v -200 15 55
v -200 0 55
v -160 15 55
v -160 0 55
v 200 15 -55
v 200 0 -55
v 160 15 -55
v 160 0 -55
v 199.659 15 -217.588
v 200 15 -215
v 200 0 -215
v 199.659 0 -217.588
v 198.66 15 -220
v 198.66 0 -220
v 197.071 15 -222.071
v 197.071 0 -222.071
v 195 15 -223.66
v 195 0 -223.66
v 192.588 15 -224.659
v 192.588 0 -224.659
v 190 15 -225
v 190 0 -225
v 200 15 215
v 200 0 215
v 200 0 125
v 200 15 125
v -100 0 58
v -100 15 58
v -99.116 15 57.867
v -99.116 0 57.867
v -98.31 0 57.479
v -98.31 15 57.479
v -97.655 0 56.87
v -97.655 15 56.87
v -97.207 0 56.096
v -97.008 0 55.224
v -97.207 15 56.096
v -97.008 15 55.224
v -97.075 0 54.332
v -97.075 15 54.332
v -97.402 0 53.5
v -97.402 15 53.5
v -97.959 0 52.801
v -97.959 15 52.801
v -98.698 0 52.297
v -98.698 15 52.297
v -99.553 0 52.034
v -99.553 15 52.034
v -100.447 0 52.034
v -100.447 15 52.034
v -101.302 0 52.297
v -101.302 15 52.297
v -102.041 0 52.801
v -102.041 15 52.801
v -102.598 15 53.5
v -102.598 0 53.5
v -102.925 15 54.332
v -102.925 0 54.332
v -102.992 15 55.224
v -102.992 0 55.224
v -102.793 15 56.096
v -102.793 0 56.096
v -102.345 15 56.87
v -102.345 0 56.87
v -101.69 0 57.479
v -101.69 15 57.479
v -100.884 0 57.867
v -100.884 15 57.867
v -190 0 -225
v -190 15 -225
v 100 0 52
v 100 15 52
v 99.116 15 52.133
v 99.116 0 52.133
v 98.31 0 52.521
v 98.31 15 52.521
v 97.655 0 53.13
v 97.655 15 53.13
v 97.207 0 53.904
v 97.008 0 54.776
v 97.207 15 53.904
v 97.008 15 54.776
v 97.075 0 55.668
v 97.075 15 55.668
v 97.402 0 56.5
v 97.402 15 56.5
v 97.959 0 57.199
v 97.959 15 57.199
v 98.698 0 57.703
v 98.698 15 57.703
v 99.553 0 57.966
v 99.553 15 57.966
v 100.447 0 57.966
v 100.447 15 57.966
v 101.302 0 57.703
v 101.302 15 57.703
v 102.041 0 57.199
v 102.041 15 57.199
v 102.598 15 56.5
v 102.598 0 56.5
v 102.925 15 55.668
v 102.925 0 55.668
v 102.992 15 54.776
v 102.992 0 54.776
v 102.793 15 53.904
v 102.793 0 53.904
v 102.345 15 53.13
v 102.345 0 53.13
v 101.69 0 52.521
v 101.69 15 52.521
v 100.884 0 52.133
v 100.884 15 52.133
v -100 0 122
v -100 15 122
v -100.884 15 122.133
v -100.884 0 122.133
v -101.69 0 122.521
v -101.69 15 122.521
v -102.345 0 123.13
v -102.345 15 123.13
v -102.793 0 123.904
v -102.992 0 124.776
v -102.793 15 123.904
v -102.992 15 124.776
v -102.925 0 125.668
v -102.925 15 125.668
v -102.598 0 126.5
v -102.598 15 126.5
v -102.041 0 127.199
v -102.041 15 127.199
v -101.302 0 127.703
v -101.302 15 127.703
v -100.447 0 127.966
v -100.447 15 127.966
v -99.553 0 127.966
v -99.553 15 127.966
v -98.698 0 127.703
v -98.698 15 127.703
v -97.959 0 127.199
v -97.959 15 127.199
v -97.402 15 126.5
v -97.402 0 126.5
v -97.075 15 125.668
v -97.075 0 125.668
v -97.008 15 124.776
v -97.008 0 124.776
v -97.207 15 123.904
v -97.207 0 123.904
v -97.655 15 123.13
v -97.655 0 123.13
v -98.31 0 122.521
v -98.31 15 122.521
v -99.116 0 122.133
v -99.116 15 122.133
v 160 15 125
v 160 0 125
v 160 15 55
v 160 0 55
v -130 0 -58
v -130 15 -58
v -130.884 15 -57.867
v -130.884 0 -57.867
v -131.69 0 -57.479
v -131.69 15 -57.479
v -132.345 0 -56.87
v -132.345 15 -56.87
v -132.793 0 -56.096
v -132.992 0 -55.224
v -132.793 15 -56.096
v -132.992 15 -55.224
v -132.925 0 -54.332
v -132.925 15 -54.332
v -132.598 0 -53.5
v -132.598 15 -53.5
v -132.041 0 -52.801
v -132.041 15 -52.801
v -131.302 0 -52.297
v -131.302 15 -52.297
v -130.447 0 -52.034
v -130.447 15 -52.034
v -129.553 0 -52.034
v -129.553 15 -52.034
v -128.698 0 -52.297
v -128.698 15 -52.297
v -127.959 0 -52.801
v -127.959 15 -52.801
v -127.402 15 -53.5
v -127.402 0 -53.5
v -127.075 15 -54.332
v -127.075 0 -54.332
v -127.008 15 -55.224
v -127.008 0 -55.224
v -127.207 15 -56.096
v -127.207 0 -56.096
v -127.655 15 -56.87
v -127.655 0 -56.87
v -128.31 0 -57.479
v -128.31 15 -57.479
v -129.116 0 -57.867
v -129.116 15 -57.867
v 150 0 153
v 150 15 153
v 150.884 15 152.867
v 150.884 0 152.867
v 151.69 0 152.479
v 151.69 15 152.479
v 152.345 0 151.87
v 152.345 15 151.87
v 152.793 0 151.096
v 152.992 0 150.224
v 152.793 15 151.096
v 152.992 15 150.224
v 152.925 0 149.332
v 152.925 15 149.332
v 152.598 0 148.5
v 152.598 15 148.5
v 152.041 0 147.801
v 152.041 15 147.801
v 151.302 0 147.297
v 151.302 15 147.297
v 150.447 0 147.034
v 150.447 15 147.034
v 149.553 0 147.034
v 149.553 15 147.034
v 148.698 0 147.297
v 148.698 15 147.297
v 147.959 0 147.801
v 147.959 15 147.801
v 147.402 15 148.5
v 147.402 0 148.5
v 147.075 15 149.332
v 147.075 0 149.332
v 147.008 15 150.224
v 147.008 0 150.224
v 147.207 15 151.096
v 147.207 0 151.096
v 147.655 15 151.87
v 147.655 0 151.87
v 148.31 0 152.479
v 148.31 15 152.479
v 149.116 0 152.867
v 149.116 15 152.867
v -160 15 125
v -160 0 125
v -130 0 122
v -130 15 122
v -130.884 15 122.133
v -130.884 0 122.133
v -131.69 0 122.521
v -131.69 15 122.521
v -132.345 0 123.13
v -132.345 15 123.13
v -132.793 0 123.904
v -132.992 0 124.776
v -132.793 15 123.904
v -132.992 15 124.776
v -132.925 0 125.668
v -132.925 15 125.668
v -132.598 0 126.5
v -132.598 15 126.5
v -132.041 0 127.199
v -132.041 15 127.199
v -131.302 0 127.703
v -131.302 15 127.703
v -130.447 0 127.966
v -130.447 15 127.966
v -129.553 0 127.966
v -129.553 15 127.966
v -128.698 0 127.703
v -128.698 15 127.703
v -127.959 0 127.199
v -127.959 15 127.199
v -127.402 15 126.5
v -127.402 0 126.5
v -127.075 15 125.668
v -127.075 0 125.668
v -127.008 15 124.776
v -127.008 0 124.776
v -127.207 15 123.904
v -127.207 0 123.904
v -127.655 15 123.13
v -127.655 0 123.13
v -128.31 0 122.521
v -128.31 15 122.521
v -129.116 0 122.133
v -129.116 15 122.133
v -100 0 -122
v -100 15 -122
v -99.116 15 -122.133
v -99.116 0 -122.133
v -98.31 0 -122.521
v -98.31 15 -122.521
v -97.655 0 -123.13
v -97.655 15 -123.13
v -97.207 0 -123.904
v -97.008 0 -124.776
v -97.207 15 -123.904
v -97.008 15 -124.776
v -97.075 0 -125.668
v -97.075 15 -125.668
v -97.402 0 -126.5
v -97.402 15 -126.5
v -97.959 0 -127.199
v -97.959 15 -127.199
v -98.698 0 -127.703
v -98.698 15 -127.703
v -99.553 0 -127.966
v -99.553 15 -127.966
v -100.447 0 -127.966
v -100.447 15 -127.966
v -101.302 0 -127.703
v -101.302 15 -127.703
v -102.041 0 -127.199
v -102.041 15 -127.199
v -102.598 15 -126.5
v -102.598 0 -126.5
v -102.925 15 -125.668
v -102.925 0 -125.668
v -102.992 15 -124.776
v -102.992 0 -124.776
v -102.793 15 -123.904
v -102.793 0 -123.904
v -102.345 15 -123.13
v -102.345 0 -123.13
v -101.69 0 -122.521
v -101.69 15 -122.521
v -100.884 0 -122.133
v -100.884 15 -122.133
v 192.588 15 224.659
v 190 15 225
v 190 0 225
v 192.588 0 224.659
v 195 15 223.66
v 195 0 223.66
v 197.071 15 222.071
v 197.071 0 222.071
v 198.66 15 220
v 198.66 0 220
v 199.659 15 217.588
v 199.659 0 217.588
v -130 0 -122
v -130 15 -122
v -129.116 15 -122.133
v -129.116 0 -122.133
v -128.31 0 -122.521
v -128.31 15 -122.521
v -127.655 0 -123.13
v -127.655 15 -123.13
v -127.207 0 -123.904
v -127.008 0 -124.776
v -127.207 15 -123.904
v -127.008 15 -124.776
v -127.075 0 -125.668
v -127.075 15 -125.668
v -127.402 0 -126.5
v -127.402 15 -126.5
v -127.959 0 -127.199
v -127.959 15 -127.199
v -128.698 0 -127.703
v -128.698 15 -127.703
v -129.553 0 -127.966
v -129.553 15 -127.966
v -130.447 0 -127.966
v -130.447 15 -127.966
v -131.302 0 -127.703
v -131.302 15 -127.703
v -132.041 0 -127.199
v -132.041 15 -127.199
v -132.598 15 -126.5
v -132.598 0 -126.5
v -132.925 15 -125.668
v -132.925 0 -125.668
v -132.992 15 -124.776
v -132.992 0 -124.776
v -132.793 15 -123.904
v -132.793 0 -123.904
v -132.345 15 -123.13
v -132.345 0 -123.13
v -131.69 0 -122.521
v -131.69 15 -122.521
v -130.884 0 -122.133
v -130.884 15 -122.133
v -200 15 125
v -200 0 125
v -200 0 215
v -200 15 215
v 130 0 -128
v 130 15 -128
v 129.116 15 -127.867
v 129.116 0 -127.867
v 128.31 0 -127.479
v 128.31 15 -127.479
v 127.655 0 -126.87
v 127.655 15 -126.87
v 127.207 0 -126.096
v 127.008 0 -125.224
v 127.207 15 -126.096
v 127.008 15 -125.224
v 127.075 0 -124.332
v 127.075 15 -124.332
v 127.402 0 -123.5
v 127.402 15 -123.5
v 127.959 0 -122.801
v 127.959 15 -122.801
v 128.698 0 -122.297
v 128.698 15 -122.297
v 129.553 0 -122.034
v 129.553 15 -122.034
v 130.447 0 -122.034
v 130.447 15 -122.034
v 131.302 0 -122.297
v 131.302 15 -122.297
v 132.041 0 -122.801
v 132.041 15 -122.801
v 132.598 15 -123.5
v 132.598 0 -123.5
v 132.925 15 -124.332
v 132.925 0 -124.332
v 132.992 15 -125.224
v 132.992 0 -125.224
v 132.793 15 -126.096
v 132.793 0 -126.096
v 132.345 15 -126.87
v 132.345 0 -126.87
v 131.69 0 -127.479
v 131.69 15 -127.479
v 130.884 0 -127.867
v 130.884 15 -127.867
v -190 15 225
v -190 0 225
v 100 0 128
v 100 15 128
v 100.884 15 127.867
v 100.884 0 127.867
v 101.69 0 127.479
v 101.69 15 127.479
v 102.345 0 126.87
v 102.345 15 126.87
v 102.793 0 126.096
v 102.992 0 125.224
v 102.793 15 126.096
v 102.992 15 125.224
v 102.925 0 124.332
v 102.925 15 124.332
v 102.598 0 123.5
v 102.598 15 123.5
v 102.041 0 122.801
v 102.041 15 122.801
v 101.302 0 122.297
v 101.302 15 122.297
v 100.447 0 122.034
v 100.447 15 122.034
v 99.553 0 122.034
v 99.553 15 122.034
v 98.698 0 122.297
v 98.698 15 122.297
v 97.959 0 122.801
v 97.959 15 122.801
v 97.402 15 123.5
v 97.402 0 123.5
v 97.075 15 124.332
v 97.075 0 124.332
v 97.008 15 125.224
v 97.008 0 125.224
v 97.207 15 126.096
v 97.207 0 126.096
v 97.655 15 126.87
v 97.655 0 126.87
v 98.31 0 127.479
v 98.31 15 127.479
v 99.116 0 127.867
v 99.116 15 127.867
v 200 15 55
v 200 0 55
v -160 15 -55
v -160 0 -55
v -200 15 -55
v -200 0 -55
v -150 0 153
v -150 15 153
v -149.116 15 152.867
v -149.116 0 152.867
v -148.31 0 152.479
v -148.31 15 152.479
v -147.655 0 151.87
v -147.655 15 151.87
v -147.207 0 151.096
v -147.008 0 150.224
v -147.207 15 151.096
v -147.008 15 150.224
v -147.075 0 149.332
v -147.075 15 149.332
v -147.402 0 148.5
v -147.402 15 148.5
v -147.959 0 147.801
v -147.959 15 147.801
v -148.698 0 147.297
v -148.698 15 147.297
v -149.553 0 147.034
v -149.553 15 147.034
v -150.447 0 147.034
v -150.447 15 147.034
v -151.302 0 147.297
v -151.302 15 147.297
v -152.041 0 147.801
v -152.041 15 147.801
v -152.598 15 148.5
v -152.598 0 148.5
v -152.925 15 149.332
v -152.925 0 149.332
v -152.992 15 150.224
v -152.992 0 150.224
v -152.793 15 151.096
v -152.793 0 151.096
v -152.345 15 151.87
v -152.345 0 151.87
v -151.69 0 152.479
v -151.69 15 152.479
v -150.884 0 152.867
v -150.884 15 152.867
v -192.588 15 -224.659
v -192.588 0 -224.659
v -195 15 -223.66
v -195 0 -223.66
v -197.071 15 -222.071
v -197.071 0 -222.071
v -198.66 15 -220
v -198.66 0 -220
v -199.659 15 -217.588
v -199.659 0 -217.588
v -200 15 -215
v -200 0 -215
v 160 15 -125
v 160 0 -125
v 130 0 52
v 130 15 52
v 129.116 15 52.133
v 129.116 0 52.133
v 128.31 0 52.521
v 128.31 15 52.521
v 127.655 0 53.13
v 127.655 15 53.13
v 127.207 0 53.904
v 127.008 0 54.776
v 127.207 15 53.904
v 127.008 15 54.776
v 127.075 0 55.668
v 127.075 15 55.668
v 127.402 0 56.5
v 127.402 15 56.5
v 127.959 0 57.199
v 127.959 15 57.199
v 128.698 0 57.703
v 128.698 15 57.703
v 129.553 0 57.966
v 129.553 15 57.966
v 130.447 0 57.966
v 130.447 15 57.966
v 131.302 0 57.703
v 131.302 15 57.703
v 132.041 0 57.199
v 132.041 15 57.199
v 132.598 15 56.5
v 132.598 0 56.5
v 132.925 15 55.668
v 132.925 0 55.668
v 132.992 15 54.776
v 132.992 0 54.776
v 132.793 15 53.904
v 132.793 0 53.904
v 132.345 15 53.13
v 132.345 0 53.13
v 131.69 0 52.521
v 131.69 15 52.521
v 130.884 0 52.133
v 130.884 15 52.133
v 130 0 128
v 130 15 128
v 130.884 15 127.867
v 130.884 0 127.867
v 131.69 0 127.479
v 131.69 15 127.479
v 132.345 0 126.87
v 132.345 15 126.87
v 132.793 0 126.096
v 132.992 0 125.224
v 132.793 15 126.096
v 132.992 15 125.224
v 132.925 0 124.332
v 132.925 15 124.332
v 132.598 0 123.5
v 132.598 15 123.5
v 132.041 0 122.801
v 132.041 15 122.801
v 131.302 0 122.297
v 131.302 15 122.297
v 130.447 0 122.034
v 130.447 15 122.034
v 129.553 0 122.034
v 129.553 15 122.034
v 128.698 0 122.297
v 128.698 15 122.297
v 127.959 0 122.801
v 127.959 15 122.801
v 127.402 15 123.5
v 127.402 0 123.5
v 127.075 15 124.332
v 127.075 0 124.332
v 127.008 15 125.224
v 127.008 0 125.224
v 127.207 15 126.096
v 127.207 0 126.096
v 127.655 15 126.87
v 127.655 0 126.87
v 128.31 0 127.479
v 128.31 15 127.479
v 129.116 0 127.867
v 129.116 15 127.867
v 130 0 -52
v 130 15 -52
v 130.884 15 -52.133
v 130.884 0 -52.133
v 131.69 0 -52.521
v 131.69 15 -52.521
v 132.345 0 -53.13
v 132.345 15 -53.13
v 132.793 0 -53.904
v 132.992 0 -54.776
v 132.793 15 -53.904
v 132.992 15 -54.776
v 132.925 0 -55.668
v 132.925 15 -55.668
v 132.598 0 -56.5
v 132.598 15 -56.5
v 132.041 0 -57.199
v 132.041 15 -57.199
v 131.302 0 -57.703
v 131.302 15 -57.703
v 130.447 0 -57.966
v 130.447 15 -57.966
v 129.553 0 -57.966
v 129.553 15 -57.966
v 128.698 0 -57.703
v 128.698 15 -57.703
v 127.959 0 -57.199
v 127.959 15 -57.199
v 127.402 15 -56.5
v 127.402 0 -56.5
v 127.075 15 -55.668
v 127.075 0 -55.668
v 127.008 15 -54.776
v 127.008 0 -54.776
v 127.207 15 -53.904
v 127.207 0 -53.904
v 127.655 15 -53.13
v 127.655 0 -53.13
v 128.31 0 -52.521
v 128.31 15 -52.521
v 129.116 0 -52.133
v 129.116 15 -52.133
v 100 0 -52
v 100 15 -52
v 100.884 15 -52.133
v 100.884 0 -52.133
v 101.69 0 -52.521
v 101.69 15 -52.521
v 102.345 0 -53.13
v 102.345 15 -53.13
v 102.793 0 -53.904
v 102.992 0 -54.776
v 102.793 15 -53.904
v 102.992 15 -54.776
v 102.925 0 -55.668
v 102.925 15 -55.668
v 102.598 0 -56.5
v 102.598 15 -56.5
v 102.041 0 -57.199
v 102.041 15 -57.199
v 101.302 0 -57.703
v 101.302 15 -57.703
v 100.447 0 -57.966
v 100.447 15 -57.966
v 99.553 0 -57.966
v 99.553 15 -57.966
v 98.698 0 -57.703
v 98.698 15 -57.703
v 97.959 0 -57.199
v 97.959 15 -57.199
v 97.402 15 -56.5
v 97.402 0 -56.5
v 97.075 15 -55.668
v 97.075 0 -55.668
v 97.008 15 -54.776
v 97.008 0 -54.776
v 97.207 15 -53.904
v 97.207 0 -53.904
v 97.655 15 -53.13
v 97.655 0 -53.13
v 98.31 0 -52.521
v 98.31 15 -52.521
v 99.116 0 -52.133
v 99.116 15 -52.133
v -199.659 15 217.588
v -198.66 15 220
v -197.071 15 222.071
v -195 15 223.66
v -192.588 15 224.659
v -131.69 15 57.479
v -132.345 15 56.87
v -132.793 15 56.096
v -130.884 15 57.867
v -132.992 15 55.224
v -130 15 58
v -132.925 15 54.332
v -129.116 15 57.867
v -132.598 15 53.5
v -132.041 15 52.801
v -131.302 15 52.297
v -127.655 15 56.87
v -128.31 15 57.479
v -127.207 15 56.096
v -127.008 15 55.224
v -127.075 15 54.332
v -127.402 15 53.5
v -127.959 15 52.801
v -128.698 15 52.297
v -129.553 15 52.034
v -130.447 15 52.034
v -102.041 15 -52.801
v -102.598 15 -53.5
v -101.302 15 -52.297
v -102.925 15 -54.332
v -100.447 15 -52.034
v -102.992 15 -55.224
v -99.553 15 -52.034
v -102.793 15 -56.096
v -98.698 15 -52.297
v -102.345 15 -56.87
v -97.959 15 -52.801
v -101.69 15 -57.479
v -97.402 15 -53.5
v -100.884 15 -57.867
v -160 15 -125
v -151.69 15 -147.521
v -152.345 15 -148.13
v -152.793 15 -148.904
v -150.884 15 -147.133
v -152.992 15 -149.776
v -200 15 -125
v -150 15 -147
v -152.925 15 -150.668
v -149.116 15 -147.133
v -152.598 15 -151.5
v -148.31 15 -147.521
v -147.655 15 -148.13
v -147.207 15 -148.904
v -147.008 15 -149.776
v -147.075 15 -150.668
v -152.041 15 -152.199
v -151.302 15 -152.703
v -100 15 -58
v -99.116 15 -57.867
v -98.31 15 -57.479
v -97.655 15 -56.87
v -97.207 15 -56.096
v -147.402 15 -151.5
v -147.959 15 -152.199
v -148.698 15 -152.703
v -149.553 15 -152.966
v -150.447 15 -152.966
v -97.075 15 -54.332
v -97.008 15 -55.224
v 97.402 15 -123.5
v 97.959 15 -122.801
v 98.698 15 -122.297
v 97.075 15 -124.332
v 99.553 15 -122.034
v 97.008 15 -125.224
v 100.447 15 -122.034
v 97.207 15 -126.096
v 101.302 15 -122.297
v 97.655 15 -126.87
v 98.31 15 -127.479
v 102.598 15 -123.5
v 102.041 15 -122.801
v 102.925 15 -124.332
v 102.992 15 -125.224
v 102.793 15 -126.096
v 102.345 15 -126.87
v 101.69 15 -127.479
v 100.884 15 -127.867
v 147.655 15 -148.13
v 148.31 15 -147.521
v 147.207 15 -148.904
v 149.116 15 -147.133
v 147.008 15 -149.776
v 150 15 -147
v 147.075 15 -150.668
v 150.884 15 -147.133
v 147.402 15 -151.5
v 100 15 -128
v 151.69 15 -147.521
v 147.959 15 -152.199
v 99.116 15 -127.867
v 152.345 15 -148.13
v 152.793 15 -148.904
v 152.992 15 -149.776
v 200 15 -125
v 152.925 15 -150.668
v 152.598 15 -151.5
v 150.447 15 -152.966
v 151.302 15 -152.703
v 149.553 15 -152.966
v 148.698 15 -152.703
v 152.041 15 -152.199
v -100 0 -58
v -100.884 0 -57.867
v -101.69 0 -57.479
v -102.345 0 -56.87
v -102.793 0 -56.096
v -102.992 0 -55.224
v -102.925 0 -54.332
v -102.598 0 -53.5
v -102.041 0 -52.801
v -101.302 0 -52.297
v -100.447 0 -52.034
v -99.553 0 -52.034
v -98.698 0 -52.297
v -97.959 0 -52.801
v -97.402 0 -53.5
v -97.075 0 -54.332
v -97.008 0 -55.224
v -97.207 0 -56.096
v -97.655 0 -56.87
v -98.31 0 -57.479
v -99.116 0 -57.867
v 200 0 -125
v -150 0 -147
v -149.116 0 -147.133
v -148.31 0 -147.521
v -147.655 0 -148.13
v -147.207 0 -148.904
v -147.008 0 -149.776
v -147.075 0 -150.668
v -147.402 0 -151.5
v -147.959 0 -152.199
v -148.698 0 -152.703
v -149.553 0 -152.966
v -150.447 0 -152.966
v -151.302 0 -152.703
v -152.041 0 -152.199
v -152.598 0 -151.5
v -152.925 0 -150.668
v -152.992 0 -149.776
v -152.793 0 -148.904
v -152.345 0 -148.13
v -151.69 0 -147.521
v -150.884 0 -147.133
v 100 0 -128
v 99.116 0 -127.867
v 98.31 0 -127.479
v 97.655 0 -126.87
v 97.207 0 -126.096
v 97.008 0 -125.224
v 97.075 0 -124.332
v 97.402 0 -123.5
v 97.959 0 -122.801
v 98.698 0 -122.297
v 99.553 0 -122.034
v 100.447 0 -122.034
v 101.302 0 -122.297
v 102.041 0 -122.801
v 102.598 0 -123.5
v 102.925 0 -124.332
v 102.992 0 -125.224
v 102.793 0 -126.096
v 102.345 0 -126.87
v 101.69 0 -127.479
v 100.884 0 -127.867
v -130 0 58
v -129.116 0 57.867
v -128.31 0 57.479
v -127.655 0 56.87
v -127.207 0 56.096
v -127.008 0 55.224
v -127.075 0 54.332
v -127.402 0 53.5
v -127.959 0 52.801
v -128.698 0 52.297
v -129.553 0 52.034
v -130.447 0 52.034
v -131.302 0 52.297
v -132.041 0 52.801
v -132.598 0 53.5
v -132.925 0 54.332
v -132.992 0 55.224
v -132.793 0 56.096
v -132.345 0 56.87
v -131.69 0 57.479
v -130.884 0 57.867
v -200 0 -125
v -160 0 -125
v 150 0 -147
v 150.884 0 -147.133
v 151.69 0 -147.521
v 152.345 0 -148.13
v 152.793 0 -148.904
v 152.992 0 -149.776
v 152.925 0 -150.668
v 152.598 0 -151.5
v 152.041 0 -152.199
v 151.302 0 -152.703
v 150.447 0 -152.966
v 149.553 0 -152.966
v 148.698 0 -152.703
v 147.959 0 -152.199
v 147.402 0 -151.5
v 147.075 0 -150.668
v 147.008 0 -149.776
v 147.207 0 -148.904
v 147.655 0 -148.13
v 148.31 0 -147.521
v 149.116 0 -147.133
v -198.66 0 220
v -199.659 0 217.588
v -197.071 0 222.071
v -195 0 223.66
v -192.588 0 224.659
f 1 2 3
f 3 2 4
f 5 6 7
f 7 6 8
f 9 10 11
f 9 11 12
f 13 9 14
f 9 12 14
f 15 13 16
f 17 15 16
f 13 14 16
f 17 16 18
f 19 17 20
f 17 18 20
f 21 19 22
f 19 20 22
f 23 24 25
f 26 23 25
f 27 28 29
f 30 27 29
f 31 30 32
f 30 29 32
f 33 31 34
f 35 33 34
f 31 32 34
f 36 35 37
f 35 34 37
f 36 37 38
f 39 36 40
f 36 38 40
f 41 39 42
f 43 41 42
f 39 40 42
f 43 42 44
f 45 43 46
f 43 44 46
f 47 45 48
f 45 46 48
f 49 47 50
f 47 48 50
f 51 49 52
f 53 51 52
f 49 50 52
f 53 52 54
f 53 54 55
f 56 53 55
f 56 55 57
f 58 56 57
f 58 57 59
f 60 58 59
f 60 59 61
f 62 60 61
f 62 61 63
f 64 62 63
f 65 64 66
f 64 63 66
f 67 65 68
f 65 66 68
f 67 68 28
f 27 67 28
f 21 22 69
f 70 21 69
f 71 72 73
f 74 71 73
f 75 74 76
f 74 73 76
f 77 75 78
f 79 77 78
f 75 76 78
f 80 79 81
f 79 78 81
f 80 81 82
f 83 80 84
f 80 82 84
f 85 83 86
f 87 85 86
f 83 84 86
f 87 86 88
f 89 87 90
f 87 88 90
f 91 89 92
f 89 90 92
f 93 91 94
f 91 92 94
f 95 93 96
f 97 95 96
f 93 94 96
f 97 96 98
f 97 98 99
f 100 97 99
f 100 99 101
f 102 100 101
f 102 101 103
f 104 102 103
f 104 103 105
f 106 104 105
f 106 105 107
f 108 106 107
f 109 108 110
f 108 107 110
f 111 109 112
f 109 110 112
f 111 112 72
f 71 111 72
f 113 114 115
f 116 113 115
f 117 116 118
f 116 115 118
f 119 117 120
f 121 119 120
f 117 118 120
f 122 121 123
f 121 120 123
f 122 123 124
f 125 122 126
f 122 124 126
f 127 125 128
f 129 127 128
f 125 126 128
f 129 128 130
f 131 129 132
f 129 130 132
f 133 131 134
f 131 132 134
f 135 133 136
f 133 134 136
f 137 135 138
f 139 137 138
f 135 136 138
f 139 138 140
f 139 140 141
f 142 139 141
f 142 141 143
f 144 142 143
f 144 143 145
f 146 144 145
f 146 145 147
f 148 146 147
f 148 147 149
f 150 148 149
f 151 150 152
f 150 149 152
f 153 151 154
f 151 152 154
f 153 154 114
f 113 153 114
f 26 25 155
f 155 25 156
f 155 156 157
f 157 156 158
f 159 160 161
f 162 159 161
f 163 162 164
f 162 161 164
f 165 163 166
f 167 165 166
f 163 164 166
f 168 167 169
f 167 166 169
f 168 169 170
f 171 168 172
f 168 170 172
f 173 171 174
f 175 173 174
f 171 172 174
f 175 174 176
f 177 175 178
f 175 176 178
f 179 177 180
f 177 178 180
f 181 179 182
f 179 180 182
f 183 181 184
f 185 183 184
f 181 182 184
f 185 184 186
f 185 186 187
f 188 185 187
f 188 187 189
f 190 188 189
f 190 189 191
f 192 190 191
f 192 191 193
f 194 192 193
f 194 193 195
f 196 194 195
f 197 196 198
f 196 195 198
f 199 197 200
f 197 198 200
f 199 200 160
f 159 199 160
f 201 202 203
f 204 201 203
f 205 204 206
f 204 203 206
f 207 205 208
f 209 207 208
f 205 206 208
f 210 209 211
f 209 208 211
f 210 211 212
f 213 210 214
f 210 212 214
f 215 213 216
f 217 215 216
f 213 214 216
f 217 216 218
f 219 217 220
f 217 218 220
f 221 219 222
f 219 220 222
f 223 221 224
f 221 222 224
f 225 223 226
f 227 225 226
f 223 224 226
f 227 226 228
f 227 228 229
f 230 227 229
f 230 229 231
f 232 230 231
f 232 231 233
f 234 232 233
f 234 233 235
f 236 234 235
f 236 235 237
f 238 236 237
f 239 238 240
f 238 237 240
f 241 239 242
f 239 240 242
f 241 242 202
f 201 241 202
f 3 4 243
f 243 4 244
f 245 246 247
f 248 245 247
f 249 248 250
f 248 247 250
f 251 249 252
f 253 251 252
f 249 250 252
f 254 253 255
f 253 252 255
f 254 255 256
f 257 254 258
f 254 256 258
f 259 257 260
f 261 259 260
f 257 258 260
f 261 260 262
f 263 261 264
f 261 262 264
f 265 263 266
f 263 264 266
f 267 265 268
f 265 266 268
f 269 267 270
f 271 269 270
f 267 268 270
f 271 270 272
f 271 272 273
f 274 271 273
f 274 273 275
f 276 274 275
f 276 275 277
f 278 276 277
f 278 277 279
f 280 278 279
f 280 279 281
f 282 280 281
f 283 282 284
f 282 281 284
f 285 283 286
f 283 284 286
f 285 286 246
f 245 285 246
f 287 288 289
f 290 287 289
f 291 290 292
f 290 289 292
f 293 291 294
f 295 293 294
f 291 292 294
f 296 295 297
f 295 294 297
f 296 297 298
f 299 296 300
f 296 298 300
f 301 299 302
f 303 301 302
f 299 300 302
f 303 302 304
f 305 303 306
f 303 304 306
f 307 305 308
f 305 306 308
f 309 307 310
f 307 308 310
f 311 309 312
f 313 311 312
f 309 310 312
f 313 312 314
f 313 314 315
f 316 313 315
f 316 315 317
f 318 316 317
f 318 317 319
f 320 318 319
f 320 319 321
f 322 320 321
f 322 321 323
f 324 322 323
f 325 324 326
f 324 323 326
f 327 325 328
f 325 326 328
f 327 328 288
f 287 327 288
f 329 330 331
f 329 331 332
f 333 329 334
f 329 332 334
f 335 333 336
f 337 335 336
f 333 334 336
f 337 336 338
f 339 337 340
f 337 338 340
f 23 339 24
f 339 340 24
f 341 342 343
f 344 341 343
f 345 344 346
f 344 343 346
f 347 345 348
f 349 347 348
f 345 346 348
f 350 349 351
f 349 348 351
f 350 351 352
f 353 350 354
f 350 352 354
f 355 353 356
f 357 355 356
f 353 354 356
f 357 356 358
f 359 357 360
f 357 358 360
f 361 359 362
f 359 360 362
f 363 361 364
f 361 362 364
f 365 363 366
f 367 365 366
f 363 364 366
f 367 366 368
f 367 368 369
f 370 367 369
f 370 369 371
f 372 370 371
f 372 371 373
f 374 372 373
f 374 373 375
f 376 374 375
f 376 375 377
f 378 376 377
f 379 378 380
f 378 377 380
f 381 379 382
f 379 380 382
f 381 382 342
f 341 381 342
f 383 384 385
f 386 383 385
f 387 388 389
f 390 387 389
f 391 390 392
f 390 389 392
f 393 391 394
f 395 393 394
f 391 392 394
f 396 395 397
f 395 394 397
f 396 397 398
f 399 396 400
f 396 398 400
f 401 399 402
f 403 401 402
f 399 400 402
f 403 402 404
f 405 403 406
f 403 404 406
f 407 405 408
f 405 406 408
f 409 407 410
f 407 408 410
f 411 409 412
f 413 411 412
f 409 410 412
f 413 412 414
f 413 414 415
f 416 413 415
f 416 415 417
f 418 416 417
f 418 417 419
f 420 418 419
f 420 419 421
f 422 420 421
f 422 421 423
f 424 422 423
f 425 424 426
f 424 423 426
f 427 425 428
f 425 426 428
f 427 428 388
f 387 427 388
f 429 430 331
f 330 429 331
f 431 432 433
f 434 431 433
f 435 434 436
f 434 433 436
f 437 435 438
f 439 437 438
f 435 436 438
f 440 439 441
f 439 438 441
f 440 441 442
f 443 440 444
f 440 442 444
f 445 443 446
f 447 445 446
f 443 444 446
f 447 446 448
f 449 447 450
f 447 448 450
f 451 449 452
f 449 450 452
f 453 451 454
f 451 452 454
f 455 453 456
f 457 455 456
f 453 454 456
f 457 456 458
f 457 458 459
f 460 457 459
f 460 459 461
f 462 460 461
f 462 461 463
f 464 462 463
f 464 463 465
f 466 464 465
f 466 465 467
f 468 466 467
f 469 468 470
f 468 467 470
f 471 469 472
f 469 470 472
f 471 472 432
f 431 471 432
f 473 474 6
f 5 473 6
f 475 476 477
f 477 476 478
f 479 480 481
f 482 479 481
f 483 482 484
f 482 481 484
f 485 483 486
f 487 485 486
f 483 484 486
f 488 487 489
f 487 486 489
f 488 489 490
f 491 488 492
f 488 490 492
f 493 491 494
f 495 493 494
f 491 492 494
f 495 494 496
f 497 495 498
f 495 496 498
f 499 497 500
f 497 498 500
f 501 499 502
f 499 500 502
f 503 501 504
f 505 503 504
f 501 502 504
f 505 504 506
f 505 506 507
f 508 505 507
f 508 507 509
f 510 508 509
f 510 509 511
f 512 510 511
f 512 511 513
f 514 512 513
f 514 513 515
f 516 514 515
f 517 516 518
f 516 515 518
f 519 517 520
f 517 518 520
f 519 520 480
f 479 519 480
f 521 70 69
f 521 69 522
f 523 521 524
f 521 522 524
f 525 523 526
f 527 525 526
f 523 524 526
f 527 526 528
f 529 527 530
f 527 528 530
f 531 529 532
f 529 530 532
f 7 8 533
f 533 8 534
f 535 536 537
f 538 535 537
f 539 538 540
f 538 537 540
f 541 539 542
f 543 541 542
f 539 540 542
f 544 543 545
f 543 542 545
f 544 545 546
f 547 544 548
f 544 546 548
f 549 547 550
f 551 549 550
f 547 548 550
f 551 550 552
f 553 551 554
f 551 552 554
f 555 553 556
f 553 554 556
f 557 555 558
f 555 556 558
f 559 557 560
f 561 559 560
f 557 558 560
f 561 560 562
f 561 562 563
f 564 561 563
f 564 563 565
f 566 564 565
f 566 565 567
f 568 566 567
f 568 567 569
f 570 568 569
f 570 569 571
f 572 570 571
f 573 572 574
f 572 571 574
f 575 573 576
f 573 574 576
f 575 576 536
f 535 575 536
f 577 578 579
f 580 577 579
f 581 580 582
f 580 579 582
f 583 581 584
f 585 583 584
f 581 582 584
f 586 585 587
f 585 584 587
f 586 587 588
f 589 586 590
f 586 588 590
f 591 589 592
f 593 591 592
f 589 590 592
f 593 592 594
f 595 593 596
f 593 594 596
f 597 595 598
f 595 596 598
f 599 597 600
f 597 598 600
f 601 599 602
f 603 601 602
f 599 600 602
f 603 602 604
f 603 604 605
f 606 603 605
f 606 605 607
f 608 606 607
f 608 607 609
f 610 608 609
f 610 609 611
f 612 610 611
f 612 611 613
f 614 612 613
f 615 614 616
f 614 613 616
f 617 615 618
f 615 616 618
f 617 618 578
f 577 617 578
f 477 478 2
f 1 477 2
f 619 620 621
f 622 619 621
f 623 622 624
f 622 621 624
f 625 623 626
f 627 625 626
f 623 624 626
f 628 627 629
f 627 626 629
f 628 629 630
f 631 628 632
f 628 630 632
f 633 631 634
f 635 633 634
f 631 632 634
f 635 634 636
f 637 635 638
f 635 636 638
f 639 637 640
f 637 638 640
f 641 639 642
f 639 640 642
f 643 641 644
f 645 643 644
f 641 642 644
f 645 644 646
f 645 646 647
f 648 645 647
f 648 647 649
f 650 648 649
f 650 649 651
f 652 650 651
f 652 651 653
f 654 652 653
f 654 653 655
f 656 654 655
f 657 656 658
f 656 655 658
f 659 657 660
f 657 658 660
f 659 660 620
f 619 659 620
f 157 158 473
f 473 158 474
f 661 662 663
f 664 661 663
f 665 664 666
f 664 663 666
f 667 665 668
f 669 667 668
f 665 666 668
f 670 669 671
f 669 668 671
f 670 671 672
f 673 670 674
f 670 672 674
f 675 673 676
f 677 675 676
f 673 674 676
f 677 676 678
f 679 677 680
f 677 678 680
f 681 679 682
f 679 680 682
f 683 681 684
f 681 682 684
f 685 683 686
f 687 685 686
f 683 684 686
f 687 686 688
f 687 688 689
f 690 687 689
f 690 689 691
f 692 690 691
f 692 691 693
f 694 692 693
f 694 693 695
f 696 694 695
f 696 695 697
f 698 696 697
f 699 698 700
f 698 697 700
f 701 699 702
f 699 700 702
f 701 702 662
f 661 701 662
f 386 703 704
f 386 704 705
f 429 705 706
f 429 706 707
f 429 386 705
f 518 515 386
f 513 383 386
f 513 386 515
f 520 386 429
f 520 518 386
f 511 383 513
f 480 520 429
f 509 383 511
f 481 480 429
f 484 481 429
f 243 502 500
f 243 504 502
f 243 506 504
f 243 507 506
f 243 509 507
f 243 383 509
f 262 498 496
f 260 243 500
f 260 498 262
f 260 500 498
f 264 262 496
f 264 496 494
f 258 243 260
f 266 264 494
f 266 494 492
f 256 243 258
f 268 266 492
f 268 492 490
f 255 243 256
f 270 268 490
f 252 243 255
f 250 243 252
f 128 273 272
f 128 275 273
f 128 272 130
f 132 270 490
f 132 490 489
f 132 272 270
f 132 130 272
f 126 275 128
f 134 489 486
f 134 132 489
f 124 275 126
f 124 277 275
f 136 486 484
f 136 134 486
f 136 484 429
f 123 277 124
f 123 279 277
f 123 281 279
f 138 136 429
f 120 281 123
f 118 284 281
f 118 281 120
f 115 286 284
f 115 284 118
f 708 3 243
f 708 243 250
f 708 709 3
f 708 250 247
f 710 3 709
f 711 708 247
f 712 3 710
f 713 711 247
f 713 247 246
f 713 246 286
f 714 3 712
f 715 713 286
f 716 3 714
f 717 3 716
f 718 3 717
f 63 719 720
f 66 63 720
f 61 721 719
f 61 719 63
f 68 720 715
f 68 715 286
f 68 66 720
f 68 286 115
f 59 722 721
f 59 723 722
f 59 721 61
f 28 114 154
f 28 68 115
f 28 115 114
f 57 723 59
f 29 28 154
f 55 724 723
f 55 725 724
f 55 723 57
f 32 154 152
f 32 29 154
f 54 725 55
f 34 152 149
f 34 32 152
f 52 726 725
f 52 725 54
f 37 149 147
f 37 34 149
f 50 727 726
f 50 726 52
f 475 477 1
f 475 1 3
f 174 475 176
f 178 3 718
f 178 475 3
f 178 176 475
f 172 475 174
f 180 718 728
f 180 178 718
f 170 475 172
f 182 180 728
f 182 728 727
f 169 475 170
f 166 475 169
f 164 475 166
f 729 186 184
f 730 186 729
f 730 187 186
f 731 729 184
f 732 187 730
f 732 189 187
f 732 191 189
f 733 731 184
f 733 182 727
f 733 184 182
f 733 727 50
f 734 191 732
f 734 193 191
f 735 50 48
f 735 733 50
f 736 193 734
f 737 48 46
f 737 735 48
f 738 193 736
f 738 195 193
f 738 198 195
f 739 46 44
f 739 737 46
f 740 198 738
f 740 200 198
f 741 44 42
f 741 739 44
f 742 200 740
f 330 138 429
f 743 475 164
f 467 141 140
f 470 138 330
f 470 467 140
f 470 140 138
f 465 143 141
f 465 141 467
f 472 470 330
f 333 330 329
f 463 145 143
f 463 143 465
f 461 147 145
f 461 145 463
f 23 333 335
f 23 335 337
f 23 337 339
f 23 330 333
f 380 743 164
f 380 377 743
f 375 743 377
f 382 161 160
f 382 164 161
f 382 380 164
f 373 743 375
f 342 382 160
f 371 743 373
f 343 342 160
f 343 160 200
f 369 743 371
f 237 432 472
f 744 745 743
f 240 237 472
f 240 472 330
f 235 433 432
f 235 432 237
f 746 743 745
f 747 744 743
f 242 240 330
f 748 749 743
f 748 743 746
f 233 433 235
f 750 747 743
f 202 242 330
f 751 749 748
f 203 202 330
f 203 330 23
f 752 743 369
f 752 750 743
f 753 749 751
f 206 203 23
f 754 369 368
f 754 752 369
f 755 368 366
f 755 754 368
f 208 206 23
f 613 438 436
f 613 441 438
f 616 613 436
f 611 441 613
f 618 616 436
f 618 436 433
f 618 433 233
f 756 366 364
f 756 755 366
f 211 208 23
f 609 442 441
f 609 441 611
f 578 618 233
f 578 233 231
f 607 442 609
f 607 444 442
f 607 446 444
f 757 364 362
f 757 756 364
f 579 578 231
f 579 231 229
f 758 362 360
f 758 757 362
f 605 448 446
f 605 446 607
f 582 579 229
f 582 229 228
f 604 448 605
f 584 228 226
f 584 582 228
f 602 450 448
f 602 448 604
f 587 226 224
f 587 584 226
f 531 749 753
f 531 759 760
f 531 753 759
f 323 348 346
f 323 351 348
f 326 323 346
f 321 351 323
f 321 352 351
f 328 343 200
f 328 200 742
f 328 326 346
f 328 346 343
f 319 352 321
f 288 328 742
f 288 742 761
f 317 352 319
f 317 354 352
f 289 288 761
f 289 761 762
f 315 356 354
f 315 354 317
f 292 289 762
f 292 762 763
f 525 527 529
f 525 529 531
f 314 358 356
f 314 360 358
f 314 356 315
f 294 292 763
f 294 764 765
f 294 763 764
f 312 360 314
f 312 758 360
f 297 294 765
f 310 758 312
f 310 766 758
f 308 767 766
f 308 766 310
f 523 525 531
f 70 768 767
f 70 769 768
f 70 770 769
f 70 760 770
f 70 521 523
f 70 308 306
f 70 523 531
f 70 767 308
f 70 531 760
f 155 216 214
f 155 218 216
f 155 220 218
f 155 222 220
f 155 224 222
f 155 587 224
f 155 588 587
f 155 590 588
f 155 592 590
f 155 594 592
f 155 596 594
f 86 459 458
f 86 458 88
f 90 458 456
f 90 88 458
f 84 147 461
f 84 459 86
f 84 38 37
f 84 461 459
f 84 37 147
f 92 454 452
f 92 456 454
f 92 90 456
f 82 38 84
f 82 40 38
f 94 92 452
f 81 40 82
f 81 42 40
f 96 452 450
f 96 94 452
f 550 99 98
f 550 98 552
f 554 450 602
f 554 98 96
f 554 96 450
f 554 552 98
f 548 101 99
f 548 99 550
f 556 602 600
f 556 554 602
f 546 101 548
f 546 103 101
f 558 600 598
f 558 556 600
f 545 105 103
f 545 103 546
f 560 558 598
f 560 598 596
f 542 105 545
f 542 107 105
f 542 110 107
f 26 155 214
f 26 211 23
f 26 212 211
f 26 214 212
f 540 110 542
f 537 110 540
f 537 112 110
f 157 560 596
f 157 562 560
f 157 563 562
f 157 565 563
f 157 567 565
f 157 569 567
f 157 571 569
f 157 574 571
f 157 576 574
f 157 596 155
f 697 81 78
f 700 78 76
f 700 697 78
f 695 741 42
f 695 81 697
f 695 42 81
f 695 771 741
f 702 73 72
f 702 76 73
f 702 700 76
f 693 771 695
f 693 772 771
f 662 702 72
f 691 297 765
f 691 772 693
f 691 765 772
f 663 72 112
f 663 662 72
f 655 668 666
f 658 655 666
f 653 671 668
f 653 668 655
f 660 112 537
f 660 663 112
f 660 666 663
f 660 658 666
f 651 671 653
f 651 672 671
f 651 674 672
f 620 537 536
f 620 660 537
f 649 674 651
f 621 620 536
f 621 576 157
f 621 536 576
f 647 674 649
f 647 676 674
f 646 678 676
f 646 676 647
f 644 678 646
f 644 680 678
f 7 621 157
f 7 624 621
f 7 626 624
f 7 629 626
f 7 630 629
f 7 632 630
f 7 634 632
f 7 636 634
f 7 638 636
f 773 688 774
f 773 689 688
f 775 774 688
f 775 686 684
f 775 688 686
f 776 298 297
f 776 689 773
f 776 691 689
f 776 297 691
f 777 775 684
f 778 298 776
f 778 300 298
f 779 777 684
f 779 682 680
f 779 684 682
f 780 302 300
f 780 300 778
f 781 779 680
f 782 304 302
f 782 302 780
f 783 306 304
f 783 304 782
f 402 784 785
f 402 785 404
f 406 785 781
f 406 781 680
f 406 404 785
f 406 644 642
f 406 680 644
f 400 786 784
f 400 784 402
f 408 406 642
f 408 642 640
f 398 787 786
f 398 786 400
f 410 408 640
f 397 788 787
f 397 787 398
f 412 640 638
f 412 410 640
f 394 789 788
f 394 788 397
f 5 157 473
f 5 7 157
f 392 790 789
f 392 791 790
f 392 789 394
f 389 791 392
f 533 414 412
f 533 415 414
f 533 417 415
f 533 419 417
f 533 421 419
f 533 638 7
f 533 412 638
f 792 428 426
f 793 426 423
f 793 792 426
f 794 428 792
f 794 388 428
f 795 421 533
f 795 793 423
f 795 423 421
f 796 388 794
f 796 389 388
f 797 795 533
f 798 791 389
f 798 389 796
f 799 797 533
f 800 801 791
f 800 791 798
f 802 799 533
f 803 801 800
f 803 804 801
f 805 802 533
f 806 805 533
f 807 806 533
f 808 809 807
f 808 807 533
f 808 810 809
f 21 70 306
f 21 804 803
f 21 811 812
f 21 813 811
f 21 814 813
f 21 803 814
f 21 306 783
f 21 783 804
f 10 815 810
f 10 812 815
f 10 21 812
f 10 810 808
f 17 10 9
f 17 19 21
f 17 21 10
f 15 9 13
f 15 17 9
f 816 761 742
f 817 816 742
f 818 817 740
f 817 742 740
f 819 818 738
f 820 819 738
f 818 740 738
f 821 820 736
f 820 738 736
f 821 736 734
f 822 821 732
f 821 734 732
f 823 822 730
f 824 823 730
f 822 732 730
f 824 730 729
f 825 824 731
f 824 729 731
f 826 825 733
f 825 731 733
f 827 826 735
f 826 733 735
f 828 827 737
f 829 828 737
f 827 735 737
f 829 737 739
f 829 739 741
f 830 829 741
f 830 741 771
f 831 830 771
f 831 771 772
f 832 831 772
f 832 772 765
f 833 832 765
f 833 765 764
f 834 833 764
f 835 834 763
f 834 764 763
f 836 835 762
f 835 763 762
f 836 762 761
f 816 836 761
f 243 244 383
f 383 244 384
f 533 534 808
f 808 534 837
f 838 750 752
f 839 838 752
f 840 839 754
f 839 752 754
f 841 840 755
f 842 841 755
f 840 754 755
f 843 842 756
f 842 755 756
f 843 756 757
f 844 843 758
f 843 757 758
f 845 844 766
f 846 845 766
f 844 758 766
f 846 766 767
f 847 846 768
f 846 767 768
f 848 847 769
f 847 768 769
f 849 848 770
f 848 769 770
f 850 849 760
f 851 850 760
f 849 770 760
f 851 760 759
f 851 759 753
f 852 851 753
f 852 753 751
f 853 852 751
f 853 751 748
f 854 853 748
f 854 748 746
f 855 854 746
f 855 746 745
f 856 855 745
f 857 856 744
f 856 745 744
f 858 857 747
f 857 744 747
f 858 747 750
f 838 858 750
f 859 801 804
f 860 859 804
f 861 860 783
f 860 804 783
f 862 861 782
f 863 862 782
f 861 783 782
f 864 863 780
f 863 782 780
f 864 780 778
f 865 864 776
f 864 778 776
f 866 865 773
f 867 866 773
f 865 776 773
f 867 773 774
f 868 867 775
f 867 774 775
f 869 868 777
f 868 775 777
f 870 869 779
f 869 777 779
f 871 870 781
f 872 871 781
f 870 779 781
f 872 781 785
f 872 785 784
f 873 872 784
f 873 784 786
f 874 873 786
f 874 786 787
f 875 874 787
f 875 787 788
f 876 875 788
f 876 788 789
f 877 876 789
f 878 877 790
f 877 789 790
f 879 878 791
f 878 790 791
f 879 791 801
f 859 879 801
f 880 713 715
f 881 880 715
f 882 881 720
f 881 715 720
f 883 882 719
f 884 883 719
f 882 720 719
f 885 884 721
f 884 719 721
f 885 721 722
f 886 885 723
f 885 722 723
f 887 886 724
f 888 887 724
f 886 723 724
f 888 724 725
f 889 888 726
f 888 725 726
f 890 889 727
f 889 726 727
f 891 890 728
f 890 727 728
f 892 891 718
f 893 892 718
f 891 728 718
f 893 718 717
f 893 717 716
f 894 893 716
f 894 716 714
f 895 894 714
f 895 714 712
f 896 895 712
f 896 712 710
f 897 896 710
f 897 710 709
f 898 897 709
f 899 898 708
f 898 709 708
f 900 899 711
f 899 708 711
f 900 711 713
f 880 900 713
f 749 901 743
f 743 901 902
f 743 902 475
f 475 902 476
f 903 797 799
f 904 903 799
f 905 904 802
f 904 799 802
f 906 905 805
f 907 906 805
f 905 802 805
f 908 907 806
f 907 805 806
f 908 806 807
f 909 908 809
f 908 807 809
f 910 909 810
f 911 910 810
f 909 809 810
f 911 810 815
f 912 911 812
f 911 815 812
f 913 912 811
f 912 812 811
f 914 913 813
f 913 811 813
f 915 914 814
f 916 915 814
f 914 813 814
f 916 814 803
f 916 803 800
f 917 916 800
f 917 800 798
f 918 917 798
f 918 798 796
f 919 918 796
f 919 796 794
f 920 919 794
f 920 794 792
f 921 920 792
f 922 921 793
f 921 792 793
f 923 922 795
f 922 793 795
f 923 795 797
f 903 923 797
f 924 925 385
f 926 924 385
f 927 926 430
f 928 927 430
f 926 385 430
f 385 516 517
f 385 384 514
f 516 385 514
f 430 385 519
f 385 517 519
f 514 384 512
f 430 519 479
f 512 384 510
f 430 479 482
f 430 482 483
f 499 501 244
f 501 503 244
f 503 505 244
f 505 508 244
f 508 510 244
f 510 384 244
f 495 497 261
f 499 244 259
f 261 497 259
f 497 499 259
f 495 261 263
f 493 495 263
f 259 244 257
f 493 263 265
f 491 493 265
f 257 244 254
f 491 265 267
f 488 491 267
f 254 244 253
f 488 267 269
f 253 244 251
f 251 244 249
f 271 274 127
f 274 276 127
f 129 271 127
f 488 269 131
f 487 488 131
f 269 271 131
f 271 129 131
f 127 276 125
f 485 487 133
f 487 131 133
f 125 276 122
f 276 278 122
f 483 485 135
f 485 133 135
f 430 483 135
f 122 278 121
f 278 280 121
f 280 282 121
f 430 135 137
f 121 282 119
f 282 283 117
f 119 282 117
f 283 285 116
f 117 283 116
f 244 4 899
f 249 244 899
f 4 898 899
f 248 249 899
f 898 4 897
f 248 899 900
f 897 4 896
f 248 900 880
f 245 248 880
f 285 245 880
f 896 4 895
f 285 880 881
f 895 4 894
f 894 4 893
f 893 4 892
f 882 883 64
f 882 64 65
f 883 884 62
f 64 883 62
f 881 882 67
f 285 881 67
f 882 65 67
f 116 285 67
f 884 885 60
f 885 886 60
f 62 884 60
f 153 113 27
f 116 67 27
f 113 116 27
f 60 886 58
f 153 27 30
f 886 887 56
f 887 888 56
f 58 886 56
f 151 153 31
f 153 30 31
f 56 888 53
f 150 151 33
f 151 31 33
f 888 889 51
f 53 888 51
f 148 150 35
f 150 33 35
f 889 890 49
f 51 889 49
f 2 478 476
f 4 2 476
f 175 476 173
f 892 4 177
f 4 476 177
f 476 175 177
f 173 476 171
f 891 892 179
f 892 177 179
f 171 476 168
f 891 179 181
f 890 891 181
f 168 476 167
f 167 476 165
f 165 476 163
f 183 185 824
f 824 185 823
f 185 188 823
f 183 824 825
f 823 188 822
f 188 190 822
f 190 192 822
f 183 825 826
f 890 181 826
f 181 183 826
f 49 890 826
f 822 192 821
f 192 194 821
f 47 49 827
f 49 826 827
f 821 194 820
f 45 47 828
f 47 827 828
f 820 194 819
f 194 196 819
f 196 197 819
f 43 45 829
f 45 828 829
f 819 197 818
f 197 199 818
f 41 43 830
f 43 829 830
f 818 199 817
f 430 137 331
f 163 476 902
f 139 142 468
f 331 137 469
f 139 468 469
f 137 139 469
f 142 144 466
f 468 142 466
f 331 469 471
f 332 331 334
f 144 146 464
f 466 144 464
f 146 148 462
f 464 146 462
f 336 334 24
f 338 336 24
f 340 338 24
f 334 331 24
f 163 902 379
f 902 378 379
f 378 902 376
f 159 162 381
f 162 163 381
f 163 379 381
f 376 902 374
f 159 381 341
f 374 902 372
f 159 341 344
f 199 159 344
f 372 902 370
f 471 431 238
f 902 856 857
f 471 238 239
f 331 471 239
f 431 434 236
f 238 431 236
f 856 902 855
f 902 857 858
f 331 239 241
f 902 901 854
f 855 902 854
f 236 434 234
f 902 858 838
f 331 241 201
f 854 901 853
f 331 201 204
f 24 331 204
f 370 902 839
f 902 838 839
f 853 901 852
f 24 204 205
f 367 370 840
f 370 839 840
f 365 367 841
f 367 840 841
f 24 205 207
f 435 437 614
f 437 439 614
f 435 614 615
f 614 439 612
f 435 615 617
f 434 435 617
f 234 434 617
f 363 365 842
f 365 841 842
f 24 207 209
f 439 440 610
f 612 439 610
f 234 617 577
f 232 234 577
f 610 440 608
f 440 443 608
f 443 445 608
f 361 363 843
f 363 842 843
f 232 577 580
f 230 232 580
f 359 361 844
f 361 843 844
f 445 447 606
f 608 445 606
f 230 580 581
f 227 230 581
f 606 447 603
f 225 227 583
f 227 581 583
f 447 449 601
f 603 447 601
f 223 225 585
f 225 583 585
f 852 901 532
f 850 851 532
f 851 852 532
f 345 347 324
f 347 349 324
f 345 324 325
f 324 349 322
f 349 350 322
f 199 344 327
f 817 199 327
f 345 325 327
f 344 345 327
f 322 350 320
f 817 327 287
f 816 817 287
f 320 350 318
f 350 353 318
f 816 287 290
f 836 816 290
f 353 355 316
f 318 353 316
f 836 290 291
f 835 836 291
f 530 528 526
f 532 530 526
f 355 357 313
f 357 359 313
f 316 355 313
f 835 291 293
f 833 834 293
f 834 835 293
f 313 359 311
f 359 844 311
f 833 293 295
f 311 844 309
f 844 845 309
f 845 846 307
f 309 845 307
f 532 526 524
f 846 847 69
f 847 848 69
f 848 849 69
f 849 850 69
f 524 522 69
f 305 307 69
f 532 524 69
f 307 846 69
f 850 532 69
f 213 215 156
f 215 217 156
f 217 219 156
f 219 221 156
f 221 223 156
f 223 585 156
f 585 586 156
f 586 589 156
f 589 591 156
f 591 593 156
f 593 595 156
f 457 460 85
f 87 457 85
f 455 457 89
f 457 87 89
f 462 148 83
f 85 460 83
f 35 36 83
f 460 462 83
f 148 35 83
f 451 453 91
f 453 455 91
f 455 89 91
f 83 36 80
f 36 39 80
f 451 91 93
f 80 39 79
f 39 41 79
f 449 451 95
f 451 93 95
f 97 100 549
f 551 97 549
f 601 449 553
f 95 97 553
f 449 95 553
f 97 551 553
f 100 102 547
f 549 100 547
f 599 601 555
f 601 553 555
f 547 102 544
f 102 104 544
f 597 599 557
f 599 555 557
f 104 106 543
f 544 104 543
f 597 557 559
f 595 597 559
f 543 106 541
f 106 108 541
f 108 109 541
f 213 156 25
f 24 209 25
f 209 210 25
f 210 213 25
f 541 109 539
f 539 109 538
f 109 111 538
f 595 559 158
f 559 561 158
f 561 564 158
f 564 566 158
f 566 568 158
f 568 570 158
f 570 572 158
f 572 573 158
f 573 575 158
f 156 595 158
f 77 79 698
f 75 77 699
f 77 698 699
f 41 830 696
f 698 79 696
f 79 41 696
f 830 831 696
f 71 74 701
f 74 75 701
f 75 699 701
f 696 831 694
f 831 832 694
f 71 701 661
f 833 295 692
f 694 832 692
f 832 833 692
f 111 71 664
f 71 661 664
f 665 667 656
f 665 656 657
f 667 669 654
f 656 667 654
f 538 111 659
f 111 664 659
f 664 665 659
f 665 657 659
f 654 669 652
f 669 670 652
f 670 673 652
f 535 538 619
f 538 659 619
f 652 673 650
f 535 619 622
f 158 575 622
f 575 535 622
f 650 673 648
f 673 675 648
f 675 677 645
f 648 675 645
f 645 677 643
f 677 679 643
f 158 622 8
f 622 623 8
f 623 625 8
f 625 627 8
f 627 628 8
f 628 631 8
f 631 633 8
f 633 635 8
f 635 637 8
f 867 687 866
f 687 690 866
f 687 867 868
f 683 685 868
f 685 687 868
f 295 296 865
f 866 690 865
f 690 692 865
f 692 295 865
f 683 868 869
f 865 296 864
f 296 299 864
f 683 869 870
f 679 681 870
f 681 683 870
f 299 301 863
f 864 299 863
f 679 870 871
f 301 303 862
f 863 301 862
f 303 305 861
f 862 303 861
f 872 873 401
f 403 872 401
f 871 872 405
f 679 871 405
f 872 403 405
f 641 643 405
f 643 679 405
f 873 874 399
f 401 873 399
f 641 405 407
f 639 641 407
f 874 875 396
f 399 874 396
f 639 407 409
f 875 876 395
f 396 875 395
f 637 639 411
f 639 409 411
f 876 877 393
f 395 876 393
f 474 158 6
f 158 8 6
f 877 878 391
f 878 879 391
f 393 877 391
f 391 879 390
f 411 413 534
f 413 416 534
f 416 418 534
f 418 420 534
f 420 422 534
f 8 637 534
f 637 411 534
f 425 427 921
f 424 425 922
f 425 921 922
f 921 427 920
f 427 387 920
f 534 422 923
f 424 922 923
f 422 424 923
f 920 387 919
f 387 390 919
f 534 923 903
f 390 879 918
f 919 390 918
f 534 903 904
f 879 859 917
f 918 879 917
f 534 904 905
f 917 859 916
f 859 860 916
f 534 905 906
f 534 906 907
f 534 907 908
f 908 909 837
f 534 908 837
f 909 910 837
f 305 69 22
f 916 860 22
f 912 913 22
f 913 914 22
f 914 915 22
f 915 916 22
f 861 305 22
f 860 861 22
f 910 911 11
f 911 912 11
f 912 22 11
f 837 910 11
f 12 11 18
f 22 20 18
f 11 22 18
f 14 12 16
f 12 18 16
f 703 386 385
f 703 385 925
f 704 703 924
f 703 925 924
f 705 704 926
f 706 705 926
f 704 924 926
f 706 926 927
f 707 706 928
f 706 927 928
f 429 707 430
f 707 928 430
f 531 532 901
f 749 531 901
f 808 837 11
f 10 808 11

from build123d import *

# Parameters (mm, degrees)
EXTRUDE_1_DEPTH     = 15
SKETCH_3_R          = 3
CUT_EXTRUDE_1_DEPTH = 15


with BuildPart() as part:
    # 草圖1 → 填料-伸長1 (new body)
    with BuildSketch(Plane(origin=(0, 0, 0), x_dir=(1, 0, 0), z_dir=(0, 1, 0))):
        with BuildLine():
            Line((-200, 55), (-200, -55))
            Line((-200, -55), (-160, -55))
            Line((-160, -55), (-160, -125))
            Line((-160, -125), (-200, -125))
            Line((-200, -125), (-200, -215))
            ThreePointArc((-200, -215), (-197.071067812, -222.071067812), (-190, -225))
            Line((-190, -225), (190, -225))
            ThreePointArc((190, -225), (197.071067812, -222.071067812), (200, -215))
            Line((200, -215), (200, -125))
            Line((200, -125), (160, -125))
            Line((160, -125), (160, -55))
            Line((160, -55), (200, -55))
            Line((200, -55), (200, 55))
            Line((200, 55), (160, 55))
            Line((160, 55), (160, 125))
            Line((160, 125), (200, 125))
            Line((200, 125), (200, 215))
            ThreePointArc((200, 215), (197.071067812, 222.071067812), (190, 225))
            Line((190, 225), (-190, 225))
            ThreePointArc((-190, 225), (-197.071067812, 222.071067812), (-200, 215))
            Line((-200, 215), (-200, 125))
            Line((-200, 125), (-160, 125))
            Line((-160, 125), (-160, 55))
            Line((-160, 55), (-200, 55))
        make_face()
    extrude(amount=EXTRUDE_1_DEPTH)

    # 草圖3 → 除料-伸長1 (cut)
    with BuildSketch(Plane(origin=(0, 15, 0), x_dir=(1, 0, 0), z_dir=(0, 1, 0))):
        with Locations(Location((-130, 125, 0), (0, 0, 270))):
            Circle(SKETCH_3_R)
        with Locations(Location((-100, 125, 0), (0, 0, 270))):
            Circle(SKETCH_3_R)
        with Locations(Location((-100, 55, 0), (0, 0, 90))):
            Circle(SKETCH_3_R)
        with Locations(Location((-130, 55, 0), (0, 0, 90))):
            Circle(SKETCH_3_R)
        with Locations(Location((100, 55, 0), (0, 0, 270))):
            Circle(SKETCH_3_R)
        with Locations(Location((130, 55, 0), (0, 0, 270))):
            Circle(SKETCH_3_R)
        with Locations(Location((100, 125, 0), (0, 0, 90))):
            Circle(SKETCH_3_R)
        with Locations(Location((130, 125, 0), (0, 0, 90))):
            Circle(SKETCH_3_R)
        with Locations(Location((100, -125, 0), (0, 0, 270))):
            Circle(SKETCH_3_R)
        with Locations(Location((130, -125, 0), (0, 0, 270))):
            Circle(SKETCH_3_R)
        with Locations(Location((130, -55, 0), (0, 0, 90))):
            Circle(SKETCH_3_R)
        with Locations(Location((100, -55, 0), (0, 0, 90))):
            Circle(SKETCH_3_R)
        with Locations(Location((-100, -55, 0), (0, 0, 270))):
            Circle(SKETCH_3_R)
        with Locations(Location((-130, -55, 0), (0, 0, 270))):
            Circle(SKETCH_3_R)
        with Locations(Location((-100, -125, 0), (0, 0, 90))):
            Circle(SKETCH_3_R)
        with Locations(Location((-130, -125, 0), (0, 0, 90))):
            Circle(SKETCH_3_R)
        with Locations(Location((-150, -150, 0), (0, 0, 270))):
            Circle(SKETCH_3_R)
        with Locations(Location((150, -150, 0), (0, 0, 270))):
            Circle(SKETCH_3_R)
        with Locations(Location((150, 150, 0), (0, 0, 270))):
            Circle(SKETCH_3_R)
        with Locations(Location((-150, 150, 0), (0, 0, 270))):
            Circle(SKETCH_3_R)
    extrude(amount=-CUT_EXTRUDE_1_DEPTH, mode=Mode.SUBTRACT)


solid = part.part
